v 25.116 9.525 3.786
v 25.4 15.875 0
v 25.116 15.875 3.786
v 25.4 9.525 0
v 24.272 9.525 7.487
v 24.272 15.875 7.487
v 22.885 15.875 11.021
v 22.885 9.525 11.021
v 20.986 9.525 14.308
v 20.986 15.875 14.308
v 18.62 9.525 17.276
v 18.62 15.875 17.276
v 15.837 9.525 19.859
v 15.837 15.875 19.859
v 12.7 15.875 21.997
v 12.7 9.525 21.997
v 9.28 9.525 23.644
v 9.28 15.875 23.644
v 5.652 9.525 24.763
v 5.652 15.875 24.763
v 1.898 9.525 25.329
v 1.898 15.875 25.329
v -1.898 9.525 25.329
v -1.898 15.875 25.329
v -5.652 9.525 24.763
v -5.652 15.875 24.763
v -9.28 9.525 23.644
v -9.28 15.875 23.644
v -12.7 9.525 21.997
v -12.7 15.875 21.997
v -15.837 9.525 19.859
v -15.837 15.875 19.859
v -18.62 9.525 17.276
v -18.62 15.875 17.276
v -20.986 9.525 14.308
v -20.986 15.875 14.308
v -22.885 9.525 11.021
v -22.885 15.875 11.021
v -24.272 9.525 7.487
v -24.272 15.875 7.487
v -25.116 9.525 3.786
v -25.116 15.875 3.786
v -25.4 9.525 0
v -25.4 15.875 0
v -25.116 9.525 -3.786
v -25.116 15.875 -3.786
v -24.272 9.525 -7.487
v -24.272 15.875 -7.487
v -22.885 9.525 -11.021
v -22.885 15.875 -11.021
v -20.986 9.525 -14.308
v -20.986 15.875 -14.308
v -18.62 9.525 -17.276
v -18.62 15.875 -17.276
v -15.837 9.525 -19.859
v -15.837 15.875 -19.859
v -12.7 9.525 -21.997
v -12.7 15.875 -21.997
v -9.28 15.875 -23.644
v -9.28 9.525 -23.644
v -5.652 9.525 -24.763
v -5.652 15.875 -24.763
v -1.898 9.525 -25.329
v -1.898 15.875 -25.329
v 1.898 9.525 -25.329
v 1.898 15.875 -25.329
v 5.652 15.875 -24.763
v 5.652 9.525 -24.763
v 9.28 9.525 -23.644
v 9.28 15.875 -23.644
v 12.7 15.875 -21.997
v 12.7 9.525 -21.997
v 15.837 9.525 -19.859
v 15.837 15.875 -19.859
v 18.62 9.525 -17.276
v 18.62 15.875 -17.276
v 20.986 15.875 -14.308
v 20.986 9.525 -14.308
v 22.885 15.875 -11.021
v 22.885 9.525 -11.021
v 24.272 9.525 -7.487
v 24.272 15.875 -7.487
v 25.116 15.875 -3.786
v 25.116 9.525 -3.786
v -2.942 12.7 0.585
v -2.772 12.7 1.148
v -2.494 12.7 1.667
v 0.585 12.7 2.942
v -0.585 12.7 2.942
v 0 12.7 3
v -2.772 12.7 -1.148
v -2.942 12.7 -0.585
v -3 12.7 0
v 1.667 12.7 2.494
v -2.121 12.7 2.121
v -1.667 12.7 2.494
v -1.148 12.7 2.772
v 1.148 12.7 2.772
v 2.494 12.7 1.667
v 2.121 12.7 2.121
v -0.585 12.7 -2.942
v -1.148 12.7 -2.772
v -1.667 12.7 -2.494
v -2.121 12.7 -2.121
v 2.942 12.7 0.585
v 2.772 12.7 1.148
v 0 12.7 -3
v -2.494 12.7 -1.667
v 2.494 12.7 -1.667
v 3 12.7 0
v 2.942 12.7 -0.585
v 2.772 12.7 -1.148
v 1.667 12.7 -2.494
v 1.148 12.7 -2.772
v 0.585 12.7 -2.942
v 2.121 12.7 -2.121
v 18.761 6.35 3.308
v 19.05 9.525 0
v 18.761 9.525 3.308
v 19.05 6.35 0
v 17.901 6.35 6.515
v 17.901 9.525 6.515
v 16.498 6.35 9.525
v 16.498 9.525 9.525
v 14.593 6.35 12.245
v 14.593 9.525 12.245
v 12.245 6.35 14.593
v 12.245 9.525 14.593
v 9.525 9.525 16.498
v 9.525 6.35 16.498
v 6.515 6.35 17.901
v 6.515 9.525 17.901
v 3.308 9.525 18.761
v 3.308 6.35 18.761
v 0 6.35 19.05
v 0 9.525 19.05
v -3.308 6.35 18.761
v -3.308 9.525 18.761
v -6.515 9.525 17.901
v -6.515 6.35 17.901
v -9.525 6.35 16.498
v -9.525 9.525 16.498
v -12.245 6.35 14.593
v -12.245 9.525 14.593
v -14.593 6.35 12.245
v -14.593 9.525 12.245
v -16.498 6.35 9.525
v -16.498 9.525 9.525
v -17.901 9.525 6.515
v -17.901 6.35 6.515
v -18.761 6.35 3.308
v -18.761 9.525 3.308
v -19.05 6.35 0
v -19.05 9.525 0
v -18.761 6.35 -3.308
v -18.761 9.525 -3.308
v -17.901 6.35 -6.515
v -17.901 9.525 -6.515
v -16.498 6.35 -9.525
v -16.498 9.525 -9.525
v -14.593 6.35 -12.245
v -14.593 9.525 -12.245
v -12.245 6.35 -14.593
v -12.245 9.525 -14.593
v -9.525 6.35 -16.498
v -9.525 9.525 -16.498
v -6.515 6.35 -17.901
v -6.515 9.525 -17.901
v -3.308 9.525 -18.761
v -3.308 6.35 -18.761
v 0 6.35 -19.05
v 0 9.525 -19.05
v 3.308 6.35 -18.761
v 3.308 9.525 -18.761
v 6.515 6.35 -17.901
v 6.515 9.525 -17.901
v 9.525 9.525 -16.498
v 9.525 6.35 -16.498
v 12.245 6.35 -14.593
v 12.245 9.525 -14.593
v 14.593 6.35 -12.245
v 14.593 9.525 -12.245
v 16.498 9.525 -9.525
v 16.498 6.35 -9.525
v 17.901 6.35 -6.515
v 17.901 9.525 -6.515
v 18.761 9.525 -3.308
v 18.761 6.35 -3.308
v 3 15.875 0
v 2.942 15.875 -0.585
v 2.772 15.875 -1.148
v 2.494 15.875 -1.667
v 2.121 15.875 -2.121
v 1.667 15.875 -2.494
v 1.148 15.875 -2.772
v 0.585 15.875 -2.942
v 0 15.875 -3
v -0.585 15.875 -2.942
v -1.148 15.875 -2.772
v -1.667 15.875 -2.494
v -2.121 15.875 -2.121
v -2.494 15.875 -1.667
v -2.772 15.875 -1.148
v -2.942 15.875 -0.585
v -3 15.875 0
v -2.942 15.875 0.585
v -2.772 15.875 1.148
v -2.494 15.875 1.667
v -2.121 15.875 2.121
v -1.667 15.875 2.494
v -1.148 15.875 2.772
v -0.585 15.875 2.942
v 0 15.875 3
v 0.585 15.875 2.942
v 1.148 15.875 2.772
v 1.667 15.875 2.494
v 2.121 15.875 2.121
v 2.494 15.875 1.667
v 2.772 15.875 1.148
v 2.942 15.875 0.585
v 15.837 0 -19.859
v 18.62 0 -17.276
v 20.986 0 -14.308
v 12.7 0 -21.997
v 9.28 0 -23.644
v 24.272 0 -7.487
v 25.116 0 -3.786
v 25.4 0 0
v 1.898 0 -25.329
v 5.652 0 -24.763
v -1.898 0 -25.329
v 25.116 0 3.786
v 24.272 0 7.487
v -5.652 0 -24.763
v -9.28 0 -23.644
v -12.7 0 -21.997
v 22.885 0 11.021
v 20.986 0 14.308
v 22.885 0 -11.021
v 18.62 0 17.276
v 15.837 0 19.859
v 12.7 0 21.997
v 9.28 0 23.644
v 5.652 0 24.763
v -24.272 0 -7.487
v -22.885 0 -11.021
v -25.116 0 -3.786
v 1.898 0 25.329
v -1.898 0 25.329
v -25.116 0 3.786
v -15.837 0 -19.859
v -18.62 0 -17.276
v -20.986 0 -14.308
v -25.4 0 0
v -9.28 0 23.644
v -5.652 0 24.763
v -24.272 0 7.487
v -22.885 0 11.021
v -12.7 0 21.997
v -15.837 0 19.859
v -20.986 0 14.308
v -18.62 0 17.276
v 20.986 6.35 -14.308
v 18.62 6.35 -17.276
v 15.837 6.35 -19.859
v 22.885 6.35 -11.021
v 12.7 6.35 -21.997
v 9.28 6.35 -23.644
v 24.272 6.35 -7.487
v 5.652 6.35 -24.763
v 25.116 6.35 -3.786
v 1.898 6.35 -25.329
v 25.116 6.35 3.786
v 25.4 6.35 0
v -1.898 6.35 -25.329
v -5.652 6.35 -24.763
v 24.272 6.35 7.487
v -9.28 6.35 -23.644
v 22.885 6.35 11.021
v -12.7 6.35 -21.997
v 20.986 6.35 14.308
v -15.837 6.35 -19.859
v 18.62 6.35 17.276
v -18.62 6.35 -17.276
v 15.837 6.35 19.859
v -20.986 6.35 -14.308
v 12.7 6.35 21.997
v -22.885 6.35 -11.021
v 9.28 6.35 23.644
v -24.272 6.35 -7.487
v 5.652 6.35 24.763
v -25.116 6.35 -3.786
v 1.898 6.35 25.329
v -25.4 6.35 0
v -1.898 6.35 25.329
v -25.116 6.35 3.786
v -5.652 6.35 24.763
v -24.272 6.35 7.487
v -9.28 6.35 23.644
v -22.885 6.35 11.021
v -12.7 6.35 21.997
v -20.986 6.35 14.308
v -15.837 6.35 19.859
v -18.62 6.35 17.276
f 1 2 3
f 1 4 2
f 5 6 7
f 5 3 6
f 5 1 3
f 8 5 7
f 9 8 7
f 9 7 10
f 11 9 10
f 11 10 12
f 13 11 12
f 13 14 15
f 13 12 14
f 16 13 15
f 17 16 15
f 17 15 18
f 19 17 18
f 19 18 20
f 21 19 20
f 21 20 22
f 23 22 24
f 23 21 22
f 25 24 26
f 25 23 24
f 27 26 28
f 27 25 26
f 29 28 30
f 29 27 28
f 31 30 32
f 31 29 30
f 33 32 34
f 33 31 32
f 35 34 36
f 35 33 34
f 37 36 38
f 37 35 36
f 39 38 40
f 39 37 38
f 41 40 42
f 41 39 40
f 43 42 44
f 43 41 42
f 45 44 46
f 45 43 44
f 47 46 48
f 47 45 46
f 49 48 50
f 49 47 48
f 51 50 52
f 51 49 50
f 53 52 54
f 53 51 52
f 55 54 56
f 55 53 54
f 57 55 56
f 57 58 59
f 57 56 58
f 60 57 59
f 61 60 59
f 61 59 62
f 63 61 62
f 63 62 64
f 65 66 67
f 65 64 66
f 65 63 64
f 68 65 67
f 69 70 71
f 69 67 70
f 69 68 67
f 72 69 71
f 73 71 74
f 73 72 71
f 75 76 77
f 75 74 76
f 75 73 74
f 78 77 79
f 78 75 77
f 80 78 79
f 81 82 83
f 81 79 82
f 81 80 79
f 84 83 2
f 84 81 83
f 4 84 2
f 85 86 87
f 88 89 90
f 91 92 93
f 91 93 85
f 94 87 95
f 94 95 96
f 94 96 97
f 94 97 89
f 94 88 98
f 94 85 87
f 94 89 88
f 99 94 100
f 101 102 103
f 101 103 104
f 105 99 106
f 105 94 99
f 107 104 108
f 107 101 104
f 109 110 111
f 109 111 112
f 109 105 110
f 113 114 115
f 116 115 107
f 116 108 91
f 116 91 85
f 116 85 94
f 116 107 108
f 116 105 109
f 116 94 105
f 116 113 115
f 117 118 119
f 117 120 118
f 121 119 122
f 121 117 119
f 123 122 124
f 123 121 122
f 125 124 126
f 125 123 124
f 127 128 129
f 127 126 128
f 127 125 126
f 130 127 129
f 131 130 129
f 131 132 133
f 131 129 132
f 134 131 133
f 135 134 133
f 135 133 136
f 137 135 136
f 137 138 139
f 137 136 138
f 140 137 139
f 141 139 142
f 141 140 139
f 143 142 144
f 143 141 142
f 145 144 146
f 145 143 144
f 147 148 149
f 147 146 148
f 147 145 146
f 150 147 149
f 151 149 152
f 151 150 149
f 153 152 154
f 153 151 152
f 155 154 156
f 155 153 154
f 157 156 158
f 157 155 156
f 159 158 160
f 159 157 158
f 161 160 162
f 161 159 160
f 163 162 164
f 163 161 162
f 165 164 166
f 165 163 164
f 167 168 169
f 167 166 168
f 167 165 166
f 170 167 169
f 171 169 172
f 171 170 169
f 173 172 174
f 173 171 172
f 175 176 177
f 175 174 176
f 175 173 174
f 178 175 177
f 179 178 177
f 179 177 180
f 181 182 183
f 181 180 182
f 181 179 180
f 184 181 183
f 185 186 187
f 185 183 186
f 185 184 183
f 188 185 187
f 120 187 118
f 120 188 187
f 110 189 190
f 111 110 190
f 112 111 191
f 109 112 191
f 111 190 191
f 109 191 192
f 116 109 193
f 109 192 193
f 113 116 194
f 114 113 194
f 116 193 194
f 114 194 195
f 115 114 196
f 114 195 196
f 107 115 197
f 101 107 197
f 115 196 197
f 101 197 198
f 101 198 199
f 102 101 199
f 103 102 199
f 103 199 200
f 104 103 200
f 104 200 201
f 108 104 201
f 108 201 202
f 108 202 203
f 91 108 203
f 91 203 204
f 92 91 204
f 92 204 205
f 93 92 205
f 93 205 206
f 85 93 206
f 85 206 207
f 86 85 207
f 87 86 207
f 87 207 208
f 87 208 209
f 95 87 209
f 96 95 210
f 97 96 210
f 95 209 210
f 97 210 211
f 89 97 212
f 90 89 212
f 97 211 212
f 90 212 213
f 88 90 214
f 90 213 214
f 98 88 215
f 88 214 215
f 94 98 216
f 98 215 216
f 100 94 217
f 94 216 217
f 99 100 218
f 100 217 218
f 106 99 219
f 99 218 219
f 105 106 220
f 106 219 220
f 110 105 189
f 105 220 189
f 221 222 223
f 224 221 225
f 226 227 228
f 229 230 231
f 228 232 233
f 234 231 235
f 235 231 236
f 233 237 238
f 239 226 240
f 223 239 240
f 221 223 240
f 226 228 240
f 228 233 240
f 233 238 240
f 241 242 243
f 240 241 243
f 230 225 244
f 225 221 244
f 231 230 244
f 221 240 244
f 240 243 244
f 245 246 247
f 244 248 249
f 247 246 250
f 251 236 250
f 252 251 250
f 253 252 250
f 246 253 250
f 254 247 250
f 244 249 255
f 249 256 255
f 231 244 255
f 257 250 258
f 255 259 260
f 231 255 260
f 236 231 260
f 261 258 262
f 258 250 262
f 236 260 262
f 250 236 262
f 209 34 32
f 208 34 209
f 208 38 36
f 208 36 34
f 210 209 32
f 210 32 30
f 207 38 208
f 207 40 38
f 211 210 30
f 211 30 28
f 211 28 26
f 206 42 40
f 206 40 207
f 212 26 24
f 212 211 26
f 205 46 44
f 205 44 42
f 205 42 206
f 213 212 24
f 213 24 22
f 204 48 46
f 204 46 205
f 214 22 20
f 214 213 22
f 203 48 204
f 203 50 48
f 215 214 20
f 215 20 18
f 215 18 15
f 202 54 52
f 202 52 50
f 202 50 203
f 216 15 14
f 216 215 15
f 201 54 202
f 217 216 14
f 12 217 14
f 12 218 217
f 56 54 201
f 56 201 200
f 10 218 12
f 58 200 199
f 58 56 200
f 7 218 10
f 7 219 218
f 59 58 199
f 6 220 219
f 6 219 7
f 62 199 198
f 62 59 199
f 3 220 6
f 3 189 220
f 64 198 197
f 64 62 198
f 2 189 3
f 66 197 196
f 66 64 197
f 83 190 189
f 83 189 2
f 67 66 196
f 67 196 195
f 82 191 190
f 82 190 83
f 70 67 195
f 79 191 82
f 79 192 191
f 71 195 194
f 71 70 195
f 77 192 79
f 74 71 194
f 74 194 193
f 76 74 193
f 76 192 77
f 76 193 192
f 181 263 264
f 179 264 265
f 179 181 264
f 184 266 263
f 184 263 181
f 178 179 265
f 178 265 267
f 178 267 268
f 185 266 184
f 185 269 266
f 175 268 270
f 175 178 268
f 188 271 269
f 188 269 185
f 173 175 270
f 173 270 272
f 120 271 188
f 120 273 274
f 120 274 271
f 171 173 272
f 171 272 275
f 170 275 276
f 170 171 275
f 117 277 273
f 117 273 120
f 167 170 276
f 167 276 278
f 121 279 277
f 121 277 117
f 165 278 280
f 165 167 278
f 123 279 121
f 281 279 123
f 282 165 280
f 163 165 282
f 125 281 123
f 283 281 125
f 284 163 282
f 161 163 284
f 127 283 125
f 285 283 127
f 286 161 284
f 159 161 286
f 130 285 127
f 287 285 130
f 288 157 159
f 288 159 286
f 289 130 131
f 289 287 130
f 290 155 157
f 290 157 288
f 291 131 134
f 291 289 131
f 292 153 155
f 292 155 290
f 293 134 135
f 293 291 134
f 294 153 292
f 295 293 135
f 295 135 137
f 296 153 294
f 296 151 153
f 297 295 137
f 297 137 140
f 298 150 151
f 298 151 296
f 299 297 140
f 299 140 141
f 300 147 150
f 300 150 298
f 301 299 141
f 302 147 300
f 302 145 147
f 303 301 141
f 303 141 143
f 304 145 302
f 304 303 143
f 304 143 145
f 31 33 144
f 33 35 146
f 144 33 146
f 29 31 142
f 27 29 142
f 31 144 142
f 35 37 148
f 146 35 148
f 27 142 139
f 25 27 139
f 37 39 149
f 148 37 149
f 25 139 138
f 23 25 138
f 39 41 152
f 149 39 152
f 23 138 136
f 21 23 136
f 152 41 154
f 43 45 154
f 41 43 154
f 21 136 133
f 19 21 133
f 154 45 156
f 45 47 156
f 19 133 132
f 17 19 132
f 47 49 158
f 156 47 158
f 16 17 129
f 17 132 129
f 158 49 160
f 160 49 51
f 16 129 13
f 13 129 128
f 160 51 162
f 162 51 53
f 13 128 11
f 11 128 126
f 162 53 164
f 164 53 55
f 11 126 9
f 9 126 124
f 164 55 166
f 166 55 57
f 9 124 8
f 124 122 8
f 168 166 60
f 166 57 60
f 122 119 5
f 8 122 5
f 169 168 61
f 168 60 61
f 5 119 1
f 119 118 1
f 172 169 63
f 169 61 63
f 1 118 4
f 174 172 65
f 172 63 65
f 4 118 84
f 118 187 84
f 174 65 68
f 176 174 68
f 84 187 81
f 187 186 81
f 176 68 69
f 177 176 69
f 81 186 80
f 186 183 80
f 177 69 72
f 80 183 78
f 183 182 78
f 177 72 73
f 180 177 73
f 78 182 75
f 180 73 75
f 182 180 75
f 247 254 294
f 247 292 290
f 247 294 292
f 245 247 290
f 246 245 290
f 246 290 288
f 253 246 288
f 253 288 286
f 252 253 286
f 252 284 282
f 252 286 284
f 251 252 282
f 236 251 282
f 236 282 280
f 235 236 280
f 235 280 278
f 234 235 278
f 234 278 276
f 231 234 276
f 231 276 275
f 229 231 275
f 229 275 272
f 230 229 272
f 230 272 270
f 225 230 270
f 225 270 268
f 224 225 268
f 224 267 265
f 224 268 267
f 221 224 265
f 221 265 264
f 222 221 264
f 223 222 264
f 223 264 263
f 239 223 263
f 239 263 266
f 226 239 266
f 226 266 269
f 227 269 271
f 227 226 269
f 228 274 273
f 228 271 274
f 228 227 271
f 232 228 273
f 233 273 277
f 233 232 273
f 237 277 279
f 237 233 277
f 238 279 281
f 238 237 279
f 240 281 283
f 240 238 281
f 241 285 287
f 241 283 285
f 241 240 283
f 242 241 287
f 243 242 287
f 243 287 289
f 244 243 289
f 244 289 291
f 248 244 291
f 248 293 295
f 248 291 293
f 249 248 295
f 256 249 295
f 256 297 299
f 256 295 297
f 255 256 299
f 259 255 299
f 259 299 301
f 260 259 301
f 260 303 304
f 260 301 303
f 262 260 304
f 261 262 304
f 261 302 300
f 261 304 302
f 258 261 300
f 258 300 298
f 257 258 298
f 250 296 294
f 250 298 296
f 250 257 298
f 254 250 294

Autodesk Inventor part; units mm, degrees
ref_plane "YZ Plane" through (0, 0, 0) normal (1, 0, 0) x (0, 1, 0)
ref_plane "XZ Plane" through (0, 0, 0) normal (0, 1, 0) x (-1, 0, 0)
ref_plane "XY Plane" through (0, 0, 0) normal (0, 0, 1) x (1, 0, 0)
sketch "Sketch1" plane through (0, 0, 0) normal (0, 1, 0) x (-1, 0, 0)
  circle A0 centre (0, 0) radius 25.4
  dimension "d0" = 50.8
extrude "Extrusion1" add sketch "Sketch1" along normal blind 6.35
sketch "Sketch2" plane through (0, 6.35, 0) normal (0, 1, 0) x (1, 0, 0)
  circle A0 centre (0, 0) radius 19.05
  dimension "d3" = 38.1
extrude "Extrusion2" add sketch "Sketch2" along normal blind 3.175
sketch "Sketch3" plane through (0, 9.525, 0) normal (0, 1, 0) x (1, 0, 0)
  circle A0 centre (0, 0) radius 25.4
  dimension "d6" = 50.8
extrude "Extrusion3" add sketch "Sketch3" along normal blind 6.35
sketch "Sketch5" plane through (0, 15.875, 0) normal (0, 1, 0) x (1, 0, 0)
  circle A0 centre (0, 0) radius 3
  dimension "d12" = 6
extrude "Extrusion5" cut sketch "Sketch5" against normal blind 3.175
properties part number "Drive_Wheel"
